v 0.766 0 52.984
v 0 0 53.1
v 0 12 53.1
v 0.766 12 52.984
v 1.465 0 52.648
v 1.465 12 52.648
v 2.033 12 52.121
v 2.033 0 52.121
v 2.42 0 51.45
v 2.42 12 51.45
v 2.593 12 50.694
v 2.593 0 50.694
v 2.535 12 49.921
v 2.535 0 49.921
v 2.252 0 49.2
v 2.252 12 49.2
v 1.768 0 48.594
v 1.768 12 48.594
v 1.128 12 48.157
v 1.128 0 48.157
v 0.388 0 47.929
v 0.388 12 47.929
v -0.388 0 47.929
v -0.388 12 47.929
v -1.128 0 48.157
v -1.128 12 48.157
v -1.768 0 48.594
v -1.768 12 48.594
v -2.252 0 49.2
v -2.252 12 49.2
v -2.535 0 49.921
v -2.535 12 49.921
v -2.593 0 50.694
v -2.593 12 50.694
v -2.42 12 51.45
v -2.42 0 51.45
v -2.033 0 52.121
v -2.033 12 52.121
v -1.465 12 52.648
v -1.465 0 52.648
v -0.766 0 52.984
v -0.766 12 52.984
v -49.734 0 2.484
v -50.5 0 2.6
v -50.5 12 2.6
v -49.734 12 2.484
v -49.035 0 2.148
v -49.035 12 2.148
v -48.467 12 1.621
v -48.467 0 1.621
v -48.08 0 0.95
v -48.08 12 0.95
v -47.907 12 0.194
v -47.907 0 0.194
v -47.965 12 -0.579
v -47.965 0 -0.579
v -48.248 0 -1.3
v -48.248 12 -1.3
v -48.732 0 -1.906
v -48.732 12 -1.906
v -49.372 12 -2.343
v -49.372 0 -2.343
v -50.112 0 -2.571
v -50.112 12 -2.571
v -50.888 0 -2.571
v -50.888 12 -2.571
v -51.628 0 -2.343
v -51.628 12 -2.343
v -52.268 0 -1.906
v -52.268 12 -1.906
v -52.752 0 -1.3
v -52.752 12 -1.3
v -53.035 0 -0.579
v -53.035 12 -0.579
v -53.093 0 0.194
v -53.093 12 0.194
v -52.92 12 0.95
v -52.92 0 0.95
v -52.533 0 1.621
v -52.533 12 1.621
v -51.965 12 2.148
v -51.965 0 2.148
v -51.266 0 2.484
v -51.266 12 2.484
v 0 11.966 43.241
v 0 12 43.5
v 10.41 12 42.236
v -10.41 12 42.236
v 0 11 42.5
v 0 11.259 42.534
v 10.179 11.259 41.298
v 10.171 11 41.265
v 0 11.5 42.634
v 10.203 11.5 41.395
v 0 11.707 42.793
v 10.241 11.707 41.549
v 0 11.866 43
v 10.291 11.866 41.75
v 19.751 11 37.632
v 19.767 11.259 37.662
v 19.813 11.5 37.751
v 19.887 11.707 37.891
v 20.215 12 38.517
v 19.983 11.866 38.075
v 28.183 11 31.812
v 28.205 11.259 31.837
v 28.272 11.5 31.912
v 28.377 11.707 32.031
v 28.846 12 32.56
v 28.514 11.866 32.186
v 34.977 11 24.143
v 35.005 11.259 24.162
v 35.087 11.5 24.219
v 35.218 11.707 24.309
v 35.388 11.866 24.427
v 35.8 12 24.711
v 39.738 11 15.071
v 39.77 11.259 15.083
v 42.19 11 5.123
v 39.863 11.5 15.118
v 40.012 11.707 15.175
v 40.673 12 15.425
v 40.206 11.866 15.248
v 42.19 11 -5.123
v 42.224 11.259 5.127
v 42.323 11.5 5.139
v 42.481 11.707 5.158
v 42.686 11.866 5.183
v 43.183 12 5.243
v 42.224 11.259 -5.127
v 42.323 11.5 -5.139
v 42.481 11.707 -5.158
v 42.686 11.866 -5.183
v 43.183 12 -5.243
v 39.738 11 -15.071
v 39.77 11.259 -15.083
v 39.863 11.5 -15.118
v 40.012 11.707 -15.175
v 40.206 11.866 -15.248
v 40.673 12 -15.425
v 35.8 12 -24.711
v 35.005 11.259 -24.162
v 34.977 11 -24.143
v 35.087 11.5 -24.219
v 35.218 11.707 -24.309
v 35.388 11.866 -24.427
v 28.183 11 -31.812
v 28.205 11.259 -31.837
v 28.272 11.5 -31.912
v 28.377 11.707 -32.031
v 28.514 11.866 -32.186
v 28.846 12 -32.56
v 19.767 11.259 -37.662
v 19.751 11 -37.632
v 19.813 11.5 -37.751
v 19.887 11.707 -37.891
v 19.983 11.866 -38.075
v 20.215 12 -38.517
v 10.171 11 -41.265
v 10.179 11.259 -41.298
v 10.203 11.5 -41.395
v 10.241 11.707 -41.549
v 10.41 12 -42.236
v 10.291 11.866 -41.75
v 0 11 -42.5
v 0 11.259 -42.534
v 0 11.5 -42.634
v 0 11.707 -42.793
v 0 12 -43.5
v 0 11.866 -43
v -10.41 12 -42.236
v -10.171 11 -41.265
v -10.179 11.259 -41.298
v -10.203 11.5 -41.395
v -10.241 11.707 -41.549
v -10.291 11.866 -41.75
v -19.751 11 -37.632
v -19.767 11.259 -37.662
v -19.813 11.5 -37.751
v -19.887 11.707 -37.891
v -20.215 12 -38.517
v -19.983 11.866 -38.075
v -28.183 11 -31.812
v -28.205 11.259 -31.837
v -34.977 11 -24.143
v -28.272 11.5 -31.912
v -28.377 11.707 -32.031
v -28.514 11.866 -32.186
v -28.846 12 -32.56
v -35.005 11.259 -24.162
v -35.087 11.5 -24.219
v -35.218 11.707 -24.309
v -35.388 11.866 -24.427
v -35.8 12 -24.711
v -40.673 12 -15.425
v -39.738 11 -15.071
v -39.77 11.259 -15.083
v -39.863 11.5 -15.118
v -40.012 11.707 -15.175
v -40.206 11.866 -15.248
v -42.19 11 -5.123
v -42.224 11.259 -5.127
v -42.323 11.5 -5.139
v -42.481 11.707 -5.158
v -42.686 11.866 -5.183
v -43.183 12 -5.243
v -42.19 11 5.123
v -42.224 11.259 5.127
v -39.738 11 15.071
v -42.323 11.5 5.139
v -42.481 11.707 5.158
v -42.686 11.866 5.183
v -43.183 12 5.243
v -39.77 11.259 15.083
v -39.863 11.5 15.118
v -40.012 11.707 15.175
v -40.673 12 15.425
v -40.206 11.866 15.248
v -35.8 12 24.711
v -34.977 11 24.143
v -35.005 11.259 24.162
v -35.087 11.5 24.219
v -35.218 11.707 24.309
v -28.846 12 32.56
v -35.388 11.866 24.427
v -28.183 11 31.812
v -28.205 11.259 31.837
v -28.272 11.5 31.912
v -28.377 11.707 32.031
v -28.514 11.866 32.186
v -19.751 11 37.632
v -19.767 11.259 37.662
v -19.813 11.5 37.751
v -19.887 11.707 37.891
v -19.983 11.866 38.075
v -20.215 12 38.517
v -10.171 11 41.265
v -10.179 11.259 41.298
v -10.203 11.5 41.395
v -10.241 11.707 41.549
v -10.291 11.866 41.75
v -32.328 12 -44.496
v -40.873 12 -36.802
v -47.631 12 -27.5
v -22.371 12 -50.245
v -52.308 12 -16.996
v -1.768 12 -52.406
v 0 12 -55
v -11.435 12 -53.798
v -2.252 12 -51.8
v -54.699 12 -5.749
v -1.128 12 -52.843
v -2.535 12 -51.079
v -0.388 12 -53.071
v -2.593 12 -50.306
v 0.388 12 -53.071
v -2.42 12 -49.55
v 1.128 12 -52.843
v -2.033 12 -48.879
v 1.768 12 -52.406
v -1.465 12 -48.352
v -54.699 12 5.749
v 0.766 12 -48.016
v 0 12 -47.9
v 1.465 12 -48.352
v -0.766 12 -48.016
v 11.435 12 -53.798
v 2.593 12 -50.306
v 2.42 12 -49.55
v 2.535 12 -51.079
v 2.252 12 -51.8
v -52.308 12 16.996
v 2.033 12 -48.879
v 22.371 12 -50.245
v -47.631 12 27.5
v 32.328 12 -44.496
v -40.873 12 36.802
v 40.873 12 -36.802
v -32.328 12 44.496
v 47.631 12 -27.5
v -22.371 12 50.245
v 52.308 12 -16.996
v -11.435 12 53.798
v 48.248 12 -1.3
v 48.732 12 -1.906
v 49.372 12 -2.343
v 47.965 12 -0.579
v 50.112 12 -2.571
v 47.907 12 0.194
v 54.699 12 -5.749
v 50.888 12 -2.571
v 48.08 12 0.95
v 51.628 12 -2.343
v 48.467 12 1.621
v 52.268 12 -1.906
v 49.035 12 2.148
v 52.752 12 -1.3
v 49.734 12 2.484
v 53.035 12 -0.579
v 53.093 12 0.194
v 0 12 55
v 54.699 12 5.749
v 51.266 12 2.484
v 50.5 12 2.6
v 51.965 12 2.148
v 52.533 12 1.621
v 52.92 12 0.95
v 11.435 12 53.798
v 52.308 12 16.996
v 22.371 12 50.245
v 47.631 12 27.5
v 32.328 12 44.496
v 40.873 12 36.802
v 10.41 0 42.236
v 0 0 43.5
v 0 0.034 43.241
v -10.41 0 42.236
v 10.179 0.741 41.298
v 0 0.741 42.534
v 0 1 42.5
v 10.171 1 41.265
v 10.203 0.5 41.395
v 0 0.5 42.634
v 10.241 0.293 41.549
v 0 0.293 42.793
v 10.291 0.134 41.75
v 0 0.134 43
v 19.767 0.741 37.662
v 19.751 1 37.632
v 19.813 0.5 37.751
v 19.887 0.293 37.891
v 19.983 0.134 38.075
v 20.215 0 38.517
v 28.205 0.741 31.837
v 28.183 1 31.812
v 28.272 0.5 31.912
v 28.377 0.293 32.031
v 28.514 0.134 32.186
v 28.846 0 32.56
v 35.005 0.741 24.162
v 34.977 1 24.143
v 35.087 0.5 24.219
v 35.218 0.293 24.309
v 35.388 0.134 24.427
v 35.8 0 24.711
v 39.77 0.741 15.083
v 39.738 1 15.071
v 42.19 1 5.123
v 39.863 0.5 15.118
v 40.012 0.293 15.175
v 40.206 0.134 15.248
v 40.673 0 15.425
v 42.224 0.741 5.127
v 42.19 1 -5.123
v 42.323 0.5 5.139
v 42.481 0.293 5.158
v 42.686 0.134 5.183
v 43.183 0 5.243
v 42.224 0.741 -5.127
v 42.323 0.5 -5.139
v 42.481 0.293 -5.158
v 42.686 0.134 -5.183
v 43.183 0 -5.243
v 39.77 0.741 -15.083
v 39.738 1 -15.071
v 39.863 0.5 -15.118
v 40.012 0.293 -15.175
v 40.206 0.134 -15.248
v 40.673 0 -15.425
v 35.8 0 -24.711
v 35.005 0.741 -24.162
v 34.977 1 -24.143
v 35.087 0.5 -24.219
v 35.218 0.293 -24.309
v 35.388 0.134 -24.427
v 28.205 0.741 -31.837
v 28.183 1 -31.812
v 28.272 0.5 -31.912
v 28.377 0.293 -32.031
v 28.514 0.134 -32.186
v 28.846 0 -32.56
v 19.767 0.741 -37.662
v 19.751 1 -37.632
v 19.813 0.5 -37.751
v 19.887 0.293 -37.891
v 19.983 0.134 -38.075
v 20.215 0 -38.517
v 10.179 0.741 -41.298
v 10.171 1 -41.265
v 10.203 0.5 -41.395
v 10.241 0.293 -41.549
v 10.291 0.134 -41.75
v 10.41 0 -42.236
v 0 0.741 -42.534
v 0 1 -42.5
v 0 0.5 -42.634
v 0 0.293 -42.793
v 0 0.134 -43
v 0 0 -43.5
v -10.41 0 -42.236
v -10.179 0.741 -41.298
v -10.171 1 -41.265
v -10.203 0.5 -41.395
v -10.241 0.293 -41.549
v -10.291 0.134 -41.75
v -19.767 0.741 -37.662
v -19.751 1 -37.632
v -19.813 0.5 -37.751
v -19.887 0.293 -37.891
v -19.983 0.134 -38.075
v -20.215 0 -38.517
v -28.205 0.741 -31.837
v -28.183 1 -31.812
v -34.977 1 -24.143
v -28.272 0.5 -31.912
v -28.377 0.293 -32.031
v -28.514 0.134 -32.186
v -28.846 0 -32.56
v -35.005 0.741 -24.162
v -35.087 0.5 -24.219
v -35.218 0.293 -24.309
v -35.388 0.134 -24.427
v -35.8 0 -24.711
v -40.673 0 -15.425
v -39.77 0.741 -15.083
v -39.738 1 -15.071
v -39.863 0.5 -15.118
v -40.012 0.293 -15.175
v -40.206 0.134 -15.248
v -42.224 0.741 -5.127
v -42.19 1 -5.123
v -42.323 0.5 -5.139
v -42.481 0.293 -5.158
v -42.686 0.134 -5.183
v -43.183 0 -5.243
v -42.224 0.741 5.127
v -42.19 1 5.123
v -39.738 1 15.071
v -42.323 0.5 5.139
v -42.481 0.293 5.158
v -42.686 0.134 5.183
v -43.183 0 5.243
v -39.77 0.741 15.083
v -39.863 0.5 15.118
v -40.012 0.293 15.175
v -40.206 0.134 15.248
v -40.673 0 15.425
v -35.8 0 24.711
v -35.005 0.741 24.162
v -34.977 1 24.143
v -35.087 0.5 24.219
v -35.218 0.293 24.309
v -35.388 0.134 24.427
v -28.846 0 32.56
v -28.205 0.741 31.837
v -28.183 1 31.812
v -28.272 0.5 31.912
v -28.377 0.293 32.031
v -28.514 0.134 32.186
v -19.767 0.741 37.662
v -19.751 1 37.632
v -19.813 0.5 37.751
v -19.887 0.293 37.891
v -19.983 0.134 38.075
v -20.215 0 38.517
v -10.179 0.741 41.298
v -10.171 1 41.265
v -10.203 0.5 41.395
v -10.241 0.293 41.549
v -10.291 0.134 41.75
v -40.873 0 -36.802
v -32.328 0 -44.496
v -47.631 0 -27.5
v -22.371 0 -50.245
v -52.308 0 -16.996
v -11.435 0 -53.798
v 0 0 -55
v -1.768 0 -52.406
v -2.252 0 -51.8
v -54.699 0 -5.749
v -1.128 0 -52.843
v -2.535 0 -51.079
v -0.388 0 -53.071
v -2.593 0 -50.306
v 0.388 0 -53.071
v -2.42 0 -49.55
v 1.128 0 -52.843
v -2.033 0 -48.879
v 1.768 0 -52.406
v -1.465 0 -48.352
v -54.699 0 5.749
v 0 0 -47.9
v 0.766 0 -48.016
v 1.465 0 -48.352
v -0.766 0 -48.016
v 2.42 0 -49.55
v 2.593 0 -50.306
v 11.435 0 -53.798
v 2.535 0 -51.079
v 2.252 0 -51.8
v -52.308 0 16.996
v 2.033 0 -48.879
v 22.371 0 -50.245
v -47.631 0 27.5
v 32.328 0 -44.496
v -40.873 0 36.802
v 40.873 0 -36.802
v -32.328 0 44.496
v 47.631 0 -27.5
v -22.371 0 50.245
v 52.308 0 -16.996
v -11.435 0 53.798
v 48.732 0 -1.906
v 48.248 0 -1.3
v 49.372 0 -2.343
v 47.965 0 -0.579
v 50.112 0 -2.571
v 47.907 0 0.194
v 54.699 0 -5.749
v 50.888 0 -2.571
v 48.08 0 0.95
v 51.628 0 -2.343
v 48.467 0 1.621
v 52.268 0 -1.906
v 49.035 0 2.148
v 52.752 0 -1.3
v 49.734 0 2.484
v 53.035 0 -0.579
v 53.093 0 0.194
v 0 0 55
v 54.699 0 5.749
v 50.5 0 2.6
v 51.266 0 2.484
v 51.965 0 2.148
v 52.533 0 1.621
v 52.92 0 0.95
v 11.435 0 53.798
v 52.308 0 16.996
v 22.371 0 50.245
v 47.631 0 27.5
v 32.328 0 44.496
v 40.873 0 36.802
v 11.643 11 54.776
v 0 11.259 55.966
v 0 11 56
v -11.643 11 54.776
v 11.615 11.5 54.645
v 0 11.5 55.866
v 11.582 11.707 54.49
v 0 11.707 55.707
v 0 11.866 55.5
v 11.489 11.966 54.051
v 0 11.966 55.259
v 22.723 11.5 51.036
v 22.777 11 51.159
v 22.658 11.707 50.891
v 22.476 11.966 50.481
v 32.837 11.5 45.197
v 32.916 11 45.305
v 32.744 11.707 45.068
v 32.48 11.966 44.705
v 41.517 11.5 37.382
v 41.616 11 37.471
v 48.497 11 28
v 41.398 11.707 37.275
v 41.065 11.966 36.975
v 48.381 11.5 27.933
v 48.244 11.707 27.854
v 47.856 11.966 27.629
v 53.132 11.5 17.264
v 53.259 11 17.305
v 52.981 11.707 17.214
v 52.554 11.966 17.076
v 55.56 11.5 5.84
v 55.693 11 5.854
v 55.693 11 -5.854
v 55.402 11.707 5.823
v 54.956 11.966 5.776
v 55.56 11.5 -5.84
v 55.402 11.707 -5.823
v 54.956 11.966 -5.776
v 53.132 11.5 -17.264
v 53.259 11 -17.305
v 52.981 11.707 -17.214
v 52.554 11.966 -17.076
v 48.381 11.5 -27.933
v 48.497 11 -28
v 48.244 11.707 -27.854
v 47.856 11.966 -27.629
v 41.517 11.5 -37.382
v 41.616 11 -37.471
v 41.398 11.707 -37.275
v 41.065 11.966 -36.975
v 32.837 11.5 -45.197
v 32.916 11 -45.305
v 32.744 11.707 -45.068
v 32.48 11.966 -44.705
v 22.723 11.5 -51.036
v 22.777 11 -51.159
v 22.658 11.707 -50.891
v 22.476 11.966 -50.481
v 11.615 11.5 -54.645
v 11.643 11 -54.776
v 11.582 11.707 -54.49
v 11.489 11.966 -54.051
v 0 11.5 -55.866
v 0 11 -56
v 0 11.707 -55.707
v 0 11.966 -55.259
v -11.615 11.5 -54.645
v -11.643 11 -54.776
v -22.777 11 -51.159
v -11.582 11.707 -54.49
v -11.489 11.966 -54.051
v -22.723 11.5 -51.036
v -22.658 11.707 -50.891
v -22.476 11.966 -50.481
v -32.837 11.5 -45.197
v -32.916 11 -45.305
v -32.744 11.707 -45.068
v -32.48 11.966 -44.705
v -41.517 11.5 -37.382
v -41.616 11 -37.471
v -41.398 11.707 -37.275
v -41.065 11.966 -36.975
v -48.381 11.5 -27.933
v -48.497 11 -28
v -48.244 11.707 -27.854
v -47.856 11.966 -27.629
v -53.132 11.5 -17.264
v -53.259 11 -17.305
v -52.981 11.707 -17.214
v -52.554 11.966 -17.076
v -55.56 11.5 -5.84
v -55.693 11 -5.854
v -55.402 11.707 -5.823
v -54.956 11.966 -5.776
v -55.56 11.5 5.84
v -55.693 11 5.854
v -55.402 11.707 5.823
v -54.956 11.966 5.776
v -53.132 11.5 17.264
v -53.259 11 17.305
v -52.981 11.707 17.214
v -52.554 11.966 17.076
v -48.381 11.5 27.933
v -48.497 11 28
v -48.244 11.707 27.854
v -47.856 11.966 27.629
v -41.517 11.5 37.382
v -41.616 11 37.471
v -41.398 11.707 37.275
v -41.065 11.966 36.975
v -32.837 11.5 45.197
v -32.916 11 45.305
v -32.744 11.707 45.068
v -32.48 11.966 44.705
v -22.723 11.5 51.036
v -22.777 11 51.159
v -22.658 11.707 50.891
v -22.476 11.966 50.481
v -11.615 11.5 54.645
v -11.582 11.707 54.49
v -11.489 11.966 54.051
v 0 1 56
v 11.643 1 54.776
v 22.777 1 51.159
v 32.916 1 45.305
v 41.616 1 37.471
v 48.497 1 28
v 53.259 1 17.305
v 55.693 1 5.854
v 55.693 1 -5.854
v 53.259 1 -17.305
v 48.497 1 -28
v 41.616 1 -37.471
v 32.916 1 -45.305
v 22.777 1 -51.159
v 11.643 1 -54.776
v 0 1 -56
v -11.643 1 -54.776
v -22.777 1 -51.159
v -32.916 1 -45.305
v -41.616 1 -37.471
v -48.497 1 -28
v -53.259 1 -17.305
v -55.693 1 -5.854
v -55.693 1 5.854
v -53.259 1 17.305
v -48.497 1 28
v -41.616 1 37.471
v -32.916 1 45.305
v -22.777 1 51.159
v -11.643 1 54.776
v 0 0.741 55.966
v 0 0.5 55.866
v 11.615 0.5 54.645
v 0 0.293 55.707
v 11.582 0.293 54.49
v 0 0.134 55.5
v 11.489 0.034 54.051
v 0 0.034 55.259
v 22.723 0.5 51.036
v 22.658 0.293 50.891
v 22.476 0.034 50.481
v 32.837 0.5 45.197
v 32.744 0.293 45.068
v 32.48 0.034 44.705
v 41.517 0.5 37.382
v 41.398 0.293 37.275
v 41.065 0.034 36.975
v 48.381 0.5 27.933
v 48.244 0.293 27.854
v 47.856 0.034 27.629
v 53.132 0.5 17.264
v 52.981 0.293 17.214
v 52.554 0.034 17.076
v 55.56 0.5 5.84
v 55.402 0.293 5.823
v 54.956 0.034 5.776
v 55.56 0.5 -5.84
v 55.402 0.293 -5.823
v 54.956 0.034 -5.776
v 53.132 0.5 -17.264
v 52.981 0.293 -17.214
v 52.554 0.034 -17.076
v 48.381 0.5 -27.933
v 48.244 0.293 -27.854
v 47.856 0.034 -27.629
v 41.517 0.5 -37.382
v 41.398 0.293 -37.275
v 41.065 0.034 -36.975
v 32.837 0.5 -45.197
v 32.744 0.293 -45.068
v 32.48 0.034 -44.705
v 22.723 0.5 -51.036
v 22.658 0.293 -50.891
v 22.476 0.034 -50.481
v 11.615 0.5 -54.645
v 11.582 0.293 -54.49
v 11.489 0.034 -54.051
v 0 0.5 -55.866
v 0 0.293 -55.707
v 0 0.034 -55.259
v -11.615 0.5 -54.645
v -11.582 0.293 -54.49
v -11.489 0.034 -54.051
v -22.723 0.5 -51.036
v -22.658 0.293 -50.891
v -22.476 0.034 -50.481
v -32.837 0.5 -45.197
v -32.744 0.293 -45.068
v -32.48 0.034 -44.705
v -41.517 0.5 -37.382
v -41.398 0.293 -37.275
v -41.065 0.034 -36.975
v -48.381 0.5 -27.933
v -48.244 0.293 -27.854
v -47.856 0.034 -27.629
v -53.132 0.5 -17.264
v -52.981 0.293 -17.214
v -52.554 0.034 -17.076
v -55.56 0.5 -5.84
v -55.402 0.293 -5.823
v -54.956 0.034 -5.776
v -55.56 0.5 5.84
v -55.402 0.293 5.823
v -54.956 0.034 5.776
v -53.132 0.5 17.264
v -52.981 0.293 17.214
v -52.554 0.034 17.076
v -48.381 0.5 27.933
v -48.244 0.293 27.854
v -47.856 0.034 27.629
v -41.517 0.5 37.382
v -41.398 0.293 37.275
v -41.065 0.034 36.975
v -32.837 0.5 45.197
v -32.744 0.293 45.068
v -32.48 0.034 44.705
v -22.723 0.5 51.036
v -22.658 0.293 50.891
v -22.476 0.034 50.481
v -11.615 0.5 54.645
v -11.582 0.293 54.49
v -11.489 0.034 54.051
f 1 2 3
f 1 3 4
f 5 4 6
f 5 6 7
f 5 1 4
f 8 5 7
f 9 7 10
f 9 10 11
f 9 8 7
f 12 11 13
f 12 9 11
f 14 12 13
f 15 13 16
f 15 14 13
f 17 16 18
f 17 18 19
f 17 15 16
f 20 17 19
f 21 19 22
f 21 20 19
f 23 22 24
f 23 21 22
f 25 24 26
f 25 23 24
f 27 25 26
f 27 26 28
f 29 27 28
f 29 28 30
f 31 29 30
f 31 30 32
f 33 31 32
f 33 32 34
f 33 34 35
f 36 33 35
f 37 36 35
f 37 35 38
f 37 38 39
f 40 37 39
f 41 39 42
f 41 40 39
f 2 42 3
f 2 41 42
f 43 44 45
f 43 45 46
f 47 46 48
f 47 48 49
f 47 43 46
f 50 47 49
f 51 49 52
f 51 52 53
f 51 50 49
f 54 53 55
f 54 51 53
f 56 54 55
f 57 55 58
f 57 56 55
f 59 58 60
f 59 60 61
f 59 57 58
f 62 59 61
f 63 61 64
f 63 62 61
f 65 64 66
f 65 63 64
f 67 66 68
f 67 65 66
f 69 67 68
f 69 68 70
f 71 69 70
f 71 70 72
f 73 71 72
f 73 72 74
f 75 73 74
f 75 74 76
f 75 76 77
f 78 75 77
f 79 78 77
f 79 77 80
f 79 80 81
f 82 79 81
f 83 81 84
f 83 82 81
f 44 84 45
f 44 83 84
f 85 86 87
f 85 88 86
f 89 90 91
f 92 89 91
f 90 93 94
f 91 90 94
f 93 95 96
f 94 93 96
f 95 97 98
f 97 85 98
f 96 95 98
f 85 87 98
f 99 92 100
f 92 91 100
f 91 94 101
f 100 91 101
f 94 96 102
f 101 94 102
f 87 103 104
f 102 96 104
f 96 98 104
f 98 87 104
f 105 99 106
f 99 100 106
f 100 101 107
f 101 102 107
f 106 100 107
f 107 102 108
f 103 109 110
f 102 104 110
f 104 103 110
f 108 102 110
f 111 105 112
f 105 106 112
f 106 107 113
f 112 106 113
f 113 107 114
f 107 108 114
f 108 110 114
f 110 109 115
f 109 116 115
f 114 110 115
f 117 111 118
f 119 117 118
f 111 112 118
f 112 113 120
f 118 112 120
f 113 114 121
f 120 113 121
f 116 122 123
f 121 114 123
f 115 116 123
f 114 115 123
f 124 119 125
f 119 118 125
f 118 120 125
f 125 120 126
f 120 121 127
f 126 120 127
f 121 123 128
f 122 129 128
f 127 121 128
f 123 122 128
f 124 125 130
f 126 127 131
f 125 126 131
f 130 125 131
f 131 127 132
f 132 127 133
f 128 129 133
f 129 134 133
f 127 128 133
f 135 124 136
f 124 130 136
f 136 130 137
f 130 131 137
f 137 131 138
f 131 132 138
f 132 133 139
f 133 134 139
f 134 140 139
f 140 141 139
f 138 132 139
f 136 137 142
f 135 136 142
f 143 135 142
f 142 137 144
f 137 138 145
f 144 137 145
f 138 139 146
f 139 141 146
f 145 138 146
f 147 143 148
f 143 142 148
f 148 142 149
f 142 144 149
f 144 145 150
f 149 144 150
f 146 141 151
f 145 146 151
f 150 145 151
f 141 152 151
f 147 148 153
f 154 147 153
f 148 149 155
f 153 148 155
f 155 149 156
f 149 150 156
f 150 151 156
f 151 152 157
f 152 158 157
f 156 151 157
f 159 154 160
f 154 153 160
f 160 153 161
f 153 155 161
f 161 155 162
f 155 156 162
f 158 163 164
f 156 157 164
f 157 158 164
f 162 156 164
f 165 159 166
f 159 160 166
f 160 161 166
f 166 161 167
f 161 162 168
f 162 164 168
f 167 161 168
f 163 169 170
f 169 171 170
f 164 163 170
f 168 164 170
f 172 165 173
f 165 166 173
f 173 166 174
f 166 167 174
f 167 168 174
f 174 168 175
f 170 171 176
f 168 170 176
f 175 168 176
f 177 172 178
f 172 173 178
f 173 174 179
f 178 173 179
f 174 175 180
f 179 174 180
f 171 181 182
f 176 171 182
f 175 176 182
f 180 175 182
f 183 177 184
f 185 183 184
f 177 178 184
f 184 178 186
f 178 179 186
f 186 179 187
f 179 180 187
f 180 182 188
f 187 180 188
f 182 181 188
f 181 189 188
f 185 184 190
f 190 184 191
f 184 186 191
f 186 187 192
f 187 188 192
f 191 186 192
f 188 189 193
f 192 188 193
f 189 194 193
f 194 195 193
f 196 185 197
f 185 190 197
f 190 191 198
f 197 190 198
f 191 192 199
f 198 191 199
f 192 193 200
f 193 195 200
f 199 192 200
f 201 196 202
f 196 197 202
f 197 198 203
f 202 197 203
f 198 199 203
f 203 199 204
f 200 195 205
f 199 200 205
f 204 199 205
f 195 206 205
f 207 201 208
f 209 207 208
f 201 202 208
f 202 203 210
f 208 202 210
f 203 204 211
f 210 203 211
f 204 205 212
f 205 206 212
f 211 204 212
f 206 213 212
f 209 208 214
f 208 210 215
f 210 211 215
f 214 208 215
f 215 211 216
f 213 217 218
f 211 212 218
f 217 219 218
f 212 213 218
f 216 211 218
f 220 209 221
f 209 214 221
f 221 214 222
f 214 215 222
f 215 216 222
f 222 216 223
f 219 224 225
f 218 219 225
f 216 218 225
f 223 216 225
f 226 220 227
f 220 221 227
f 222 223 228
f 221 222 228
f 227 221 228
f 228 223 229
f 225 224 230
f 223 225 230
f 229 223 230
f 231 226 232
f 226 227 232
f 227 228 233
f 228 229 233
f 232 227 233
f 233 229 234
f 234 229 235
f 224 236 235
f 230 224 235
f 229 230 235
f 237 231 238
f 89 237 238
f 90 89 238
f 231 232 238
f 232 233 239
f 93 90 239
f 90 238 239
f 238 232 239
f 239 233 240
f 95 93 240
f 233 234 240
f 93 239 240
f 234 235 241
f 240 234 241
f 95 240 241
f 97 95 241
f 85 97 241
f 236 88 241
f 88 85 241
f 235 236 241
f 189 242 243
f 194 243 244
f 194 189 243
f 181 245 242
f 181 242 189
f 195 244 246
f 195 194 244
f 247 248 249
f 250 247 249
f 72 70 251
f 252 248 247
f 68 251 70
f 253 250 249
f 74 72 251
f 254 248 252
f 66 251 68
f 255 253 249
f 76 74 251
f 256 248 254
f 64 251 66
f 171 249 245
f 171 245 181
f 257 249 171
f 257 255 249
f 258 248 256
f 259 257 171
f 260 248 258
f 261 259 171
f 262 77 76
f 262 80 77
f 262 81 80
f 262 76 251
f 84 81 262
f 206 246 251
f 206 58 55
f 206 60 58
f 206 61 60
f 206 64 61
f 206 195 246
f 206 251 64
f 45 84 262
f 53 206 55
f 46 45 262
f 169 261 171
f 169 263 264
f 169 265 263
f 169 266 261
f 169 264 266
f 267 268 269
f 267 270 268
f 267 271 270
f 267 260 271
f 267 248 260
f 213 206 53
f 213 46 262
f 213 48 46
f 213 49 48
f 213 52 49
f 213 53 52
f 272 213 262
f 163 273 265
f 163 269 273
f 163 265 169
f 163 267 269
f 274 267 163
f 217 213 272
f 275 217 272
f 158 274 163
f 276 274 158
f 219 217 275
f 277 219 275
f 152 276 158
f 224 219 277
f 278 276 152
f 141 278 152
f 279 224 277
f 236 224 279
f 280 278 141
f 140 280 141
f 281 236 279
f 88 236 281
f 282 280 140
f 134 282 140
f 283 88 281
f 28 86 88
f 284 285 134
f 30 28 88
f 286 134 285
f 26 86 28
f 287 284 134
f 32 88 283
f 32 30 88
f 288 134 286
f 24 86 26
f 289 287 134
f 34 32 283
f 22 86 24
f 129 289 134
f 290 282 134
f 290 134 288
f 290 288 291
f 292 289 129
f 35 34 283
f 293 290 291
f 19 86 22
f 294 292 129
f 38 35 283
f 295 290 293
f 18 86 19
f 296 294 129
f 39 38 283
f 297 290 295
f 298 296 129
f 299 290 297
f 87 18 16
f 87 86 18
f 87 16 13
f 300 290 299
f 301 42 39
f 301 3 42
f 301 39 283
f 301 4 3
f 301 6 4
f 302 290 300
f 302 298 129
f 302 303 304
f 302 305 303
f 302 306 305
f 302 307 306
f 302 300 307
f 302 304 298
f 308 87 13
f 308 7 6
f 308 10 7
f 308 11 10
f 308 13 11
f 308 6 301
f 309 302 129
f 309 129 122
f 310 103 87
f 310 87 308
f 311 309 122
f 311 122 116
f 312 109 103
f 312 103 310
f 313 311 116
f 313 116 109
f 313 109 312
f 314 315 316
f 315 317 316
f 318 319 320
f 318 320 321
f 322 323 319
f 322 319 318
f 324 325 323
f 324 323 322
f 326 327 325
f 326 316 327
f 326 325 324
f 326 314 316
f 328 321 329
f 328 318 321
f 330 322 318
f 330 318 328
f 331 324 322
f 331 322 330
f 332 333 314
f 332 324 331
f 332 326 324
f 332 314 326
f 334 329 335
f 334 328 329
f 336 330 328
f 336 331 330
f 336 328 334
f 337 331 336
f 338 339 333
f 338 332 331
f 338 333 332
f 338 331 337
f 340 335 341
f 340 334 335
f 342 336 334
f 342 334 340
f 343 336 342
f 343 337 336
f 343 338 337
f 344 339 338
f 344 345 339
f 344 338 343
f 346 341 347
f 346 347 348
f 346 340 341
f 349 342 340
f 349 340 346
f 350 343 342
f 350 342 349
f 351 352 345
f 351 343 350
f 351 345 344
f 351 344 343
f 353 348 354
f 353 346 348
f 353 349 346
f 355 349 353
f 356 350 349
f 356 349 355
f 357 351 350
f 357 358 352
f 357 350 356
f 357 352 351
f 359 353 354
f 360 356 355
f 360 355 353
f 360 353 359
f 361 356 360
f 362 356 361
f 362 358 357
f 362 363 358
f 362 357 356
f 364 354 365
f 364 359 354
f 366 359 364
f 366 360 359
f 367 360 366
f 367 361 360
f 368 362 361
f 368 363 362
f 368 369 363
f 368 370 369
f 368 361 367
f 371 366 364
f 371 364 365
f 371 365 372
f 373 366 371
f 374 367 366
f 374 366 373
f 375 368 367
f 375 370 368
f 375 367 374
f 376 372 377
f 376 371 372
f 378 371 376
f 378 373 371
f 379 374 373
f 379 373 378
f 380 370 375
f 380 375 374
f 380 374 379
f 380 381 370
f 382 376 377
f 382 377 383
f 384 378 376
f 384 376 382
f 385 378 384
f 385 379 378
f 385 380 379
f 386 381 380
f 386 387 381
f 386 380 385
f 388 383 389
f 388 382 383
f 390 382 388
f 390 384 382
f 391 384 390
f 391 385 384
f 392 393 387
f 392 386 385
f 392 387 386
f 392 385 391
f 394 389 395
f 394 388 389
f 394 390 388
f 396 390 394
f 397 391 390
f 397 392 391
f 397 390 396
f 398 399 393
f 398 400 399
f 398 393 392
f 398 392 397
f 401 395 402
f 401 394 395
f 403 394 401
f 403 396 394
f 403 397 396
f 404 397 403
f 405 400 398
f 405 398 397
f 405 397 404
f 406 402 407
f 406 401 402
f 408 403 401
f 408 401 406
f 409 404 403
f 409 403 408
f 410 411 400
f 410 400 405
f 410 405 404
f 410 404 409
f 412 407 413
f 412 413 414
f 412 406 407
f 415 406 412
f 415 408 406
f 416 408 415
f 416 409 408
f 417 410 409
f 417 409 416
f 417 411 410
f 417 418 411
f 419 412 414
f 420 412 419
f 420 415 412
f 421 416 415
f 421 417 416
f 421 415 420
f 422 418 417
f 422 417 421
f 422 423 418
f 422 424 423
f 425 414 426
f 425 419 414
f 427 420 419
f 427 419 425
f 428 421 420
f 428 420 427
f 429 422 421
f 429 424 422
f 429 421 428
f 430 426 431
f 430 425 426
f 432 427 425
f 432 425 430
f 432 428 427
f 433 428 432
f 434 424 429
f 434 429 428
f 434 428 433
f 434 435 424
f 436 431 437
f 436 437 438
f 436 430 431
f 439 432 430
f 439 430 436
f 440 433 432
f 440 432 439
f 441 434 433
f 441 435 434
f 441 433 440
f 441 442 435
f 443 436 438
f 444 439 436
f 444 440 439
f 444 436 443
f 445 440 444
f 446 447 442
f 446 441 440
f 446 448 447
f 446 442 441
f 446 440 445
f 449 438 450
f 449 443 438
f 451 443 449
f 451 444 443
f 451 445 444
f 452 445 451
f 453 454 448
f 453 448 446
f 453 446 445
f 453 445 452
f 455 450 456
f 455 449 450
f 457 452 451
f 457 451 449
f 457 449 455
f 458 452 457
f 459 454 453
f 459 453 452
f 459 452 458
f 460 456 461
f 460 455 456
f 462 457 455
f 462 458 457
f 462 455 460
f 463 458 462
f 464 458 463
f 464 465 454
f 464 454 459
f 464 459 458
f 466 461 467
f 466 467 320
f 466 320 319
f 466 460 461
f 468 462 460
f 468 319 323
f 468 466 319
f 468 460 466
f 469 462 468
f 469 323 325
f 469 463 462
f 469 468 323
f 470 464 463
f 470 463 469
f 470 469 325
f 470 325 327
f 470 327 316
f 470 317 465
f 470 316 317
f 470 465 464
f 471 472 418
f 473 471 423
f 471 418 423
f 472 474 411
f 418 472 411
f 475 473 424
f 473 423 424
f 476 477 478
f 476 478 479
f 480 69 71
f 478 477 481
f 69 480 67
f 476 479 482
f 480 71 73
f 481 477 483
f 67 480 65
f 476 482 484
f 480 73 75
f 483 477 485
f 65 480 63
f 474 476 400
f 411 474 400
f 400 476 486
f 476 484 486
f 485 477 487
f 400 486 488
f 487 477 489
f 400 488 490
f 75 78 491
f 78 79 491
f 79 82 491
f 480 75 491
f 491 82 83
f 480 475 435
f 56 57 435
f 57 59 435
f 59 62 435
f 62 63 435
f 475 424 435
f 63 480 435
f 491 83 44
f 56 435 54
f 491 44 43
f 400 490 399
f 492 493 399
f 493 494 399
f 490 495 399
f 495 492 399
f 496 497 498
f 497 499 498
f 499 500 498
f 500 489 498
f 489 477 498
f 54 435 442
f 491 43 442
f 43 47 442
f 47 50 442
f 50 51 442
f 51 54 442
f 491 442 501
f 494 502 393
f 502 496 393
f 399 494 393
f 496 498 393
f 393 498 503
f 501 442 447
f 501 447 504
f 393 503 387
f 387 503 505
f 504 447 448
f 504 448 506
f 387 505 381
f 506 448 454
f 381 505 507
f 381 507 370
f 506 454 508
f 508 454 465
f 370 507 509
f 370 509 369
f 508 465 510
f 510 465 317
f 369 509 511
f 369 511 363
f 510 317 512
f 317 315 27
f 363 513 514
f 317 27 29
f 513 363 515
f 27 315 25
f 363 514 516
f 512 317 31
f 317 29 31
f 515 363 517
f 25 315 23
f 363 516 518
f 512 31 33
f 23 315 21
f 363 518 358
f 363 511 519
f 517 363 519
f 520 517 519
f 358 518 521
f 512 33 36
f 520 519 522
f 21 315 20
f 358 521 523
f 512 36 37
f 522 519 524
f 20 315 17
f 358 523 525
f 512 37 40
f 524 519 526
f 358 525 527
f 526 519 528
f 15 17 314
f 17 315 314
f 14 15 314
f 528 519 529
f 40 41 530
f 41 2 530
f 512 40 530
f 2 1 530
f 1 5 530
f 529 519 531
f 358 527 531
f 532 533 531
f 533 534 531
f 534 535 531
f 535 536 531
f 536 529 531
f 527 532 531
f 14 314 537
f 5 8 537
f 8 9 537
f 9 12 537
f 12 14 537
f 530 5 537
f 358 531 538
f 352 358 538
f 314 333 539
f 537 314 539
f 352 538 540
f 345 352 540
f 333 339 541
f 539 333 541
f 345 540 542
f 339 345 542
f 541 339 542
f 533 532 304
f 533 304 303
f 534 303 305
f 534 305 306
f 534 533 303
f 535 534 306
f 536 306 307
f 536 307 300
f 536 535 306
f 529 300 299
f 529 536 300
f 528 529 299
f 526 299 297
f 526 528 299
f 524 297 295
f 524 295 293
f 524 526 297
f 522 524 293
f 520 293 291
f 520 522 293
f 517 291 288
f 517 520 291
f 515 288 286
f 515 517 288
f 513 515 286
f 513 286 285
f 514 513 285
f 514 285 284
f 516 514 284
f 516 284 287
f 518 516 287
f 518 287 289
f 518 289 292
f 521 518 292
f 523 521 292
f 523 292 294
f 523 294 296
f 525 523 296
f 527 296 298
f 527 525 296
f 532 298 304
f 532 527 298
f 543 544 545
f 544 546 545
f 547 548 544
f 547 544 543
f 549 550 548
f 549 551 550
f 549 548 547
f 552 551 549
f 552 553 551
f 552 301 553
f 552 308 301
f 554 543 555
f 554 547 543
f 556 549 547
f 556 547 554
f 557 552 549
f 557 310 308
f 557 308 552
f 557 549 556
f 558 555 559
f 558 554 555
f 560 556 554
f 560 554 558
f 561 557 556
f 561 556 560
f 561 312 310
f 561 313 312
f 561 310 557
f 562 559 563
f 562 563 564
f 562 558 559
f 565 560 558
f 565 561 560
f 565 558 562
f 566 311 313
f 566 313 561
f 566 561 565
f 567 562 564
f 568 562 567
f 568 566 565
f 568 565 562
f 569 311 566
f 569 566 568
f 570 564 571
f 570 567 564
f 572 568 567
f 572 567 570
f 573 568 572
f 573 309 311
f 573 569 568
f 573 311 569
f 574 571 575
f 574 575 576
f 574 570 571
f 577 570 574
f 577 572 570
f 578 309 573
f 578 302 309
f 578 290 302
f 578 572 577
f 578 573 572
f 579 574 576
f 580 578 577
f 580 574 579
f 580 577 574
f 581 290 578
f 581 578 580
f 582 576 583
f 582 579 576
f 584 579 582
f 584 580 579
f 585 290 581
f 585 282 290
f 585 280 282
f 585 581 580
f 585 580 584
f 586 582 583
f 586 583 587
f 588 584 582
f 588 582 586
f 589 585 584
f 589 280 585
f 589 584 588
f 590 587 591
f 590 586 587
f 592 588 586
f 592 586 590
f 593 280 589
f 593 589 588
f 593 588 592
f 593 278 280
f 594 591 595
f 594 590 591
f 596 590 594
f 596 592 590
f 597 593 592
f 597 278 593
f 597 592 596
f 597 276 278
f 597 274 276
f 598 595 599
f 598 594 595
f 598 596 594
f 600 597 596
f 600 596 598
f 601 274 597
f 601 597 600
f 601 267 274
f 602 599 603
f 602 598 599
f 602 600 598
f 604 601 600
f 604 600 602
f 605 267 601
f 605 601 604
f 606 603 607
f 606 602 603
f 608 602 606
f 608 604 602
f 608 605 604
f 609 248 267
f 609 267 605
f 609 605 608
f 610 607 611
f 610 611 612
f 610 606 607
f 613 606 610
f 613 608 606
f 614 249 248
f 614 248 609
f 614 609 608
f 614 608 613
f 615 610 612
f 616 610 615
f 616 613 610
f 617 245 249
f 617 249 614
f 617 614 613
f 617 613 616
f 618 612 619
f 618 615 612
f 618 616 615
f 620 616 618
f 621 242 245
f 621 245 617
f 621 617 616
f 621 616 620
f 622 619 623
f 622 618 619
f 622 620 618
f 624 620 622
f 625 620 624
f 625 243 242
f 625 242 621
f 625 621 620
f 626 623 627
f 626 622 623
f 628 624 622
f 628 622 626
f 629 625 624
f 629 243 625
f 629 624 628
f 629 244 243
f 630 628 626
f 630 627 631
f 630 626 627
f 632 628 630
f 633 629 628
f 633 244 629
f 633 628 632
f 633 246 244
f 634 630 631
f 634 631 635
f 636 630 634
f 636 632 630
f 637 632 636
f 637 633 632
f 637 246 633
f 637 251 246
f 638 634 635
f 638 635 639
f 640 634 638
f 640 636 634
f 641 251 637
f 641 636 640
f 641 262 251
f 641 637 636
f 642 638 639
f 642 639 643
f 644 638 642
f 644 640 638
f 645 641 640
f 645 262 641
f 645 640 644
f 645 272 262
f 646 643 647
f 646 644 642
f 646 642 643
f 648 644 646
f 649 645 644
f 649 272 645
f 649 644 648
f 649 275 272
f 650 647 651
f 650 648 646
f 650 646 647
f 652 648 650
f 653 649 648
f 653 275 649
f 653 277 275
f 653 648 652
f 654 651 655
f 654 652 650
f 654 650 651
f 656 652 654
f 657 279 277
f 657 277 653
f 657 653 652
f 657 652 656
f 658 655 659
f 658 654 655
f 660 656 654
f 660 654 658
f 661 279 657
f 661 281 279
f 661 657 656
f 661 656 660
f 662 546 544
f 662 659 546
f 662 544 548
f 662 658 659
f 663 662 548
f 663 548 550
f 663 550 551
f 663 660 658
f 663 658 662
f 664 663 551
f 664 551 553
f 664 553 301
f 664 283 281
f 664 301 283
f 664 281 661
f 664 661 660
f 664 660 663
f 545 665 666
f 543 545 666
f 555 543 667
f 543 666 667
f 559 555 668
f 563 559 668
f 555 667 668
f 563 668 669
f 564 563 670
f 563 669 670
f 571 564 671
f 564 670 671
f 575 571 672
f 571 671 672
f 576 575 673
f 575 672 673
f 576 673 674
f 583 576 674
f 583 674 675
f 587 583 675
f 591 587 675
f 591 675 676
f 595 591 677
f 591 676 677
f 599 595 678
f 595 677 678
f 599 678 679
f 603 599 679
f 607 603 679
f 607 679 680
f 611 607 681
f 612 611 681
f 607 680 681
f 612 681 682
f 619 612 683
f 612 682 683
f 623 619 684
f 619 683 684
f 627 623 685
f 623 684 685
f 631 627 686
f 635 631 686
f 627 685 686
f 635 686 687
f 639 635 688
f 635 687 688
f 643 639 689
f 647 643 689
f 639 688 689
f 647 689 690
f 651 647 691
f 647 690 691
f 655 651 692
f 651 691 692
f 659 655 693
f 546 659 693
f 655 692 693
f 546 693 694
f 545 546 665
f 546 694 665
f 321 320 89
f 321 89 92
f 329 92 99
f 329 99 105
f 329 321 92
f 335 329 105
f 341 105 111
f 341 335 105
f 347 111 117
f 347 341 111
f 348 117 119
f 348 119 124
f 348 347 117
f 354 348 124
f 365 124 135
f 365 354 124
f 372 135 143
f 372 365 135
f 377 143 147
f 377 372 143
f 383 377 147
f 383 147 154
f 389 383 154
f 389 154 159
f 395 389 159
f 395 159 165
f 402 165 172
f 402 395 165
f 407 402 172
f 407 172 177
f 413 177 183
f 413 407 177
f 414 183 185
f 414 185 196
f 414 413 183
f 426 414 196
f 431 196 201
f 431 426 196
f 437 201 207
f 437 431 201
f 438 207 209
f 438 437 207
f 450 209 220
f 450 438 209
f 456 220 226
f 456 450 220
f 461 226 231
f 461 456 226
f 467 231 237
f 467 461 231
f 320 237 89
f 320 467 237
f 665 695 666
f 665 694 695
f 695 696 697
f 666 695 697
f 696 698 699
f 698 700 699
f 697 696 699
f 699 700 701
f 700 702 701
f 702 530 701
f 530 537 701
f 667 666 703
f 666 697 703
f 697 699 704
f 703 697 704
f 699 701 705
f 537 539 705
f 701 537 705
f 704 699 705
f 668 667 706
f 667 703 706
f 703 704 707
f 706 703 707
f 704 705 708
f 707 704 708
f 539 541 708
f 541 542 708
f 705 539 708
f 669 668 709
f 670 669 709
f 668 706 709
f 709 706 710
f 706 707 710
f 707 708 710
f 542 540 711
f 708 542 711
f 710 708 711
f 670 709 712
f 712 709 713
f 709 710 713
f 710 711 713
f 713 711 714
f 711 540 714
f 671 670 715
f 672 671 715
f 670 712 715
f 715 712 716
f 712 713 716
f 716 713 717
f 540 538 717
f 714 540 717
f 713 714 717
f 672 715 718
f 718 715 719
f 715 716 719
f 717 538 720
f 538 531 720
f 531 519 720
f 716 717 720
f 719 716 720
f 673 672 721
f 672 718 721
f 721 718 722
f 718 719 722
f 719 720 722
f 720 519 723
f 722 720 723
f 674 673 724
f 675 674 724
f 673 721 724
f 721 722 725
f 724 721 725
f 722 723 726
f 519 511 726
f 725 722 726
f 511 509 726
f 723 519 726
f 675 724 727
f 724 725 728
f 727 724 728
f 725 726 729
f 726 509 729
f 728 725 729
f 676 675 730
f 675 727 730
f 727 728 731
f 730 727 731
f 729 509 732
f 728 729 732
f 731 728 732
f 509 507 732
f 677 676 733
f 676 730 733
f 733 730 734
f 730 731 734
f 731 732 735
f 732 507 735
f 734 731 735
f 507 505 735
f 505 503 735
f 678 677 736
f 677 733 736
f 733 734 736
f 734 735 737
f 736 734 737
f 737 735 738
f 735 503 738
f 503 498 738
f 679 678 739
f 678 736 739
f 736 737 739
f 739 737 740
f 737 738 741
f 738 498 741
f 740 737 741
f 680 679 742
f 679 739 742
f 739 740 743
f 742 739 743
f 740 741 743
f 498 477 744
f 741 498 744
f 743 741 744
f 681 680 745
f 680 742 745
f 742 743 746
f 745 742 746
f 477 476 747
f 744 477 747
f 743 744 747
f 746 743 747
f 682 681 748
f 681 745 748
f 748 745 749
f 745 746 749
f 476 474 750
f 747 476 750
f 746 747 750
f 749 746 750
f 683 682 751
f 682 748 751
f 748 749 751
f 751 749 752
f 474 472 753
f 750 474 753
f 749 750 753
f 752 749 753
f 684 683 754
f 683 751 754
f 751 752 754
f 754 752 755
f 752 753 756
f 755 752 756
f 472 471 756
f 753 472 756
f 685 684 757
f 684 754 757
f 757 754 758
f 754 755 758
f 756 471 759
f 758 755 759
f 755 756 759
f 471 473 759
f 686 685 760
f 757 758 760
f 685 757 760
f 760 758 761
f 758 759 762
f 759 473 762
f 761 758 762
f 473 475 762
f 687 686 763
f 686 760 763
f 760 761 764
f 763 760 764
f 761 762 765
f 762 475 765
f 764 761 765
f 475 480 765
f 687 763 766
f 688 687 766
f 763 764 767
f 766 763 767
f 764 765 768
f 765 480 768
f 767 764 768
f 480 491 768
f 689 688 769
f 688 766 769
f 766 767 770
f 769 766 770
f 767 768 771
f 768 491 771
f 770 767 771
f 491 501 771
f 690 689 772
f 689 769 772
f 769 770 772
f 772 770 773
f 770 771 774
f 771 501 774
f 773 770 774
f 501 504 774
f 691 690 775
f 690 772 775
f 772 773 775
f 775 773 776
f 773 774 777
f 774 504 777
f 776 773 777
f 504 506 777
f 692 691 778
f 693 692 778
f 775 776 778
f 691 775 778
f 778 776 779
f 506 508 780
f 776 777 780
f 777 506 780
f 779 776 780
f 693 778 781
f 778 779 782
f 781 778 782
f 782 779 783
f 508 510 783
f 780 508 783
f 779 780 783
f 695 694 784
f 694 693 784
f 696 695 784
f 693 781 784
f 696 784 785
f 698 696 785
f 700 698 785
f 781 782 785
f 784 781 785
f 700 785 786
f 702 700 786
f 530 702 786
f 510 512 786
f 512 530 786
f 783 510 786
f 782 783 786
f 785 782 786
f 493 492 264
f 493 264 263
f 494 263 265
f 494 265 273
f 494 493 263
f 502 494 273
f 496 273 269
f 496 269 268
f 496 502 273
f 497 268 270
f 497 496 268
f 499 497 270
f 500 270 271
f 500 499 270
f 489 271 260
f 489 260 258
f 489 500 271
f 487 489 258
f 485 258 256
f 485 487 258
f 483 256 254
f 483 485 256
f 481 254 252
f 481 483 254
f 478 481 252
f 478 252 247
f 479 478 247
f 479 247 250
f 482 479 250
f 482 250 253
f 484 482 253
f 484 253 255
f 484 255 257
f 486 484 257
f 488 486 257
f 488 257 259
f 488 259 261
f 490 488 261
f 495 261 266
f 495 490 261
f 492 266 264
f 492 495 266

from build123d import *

# Parameters (mm, degrees)
SKETCH_3_R      = 56
SKETCH_3_R_2    = 42.5
SKETCH_3_R_3    = 2.6
EXTRUDE_1_DEPTH = 12
FILLET_1_R      = 1


with BuildPart() as part:
    # 草图3 → 凸台-拉伸1 (new body)
    with BuildSketch(Plane(origin=(0, 0, 0), x_dir=(1, 0, 0), z_dir=(0, 1, 0))):
        with Locations(Location((0, 0, 0), (0, 0, 270))):
            Circle(SKETCH_3_R)
        with Locations(Location((0, 0, 0), (0, 0, 270))):
            Circle(SKETCH_3_R_2, mode=Mode.SUBTRACT)
        with Locations(Location((50.5, 0, 0), (0, 0, 270))):
            Circle(SKETCH_3_R_3, mode=Mode.SUBTRACT)
        with Locations(Location((0, -50.5, 0), (0, 0, 270))):
            Circle(SKETCH_3_R_3, mode=Mode.SUBTRACT)
        with Locations(Location((-50.5, 0, 0), (0, 0, 270))):
            Circle(SKETCH_3_R_3, mode=Mode.SUBTRACT)
        with Locations(Location((0, 50.5, 0), (0, 0, 270))):
            Circle(SKETCH_3_R_3, mode=Mode.SUBTRACT)
    extrude(amount=EXTRUDE_1_DEPTH)

    # 圆角1
    fillet_1_edges = [part.edges().sort_by_distance(p)[0] for p in [
        (0, 0, -56),
        (0, 12, -56),
        (0, 0, -42.5),
        (0, 12, -42.5),
    ]]
    fillet(fillet_1_edges, radius=FILLET_1_R)


solid = part.part
